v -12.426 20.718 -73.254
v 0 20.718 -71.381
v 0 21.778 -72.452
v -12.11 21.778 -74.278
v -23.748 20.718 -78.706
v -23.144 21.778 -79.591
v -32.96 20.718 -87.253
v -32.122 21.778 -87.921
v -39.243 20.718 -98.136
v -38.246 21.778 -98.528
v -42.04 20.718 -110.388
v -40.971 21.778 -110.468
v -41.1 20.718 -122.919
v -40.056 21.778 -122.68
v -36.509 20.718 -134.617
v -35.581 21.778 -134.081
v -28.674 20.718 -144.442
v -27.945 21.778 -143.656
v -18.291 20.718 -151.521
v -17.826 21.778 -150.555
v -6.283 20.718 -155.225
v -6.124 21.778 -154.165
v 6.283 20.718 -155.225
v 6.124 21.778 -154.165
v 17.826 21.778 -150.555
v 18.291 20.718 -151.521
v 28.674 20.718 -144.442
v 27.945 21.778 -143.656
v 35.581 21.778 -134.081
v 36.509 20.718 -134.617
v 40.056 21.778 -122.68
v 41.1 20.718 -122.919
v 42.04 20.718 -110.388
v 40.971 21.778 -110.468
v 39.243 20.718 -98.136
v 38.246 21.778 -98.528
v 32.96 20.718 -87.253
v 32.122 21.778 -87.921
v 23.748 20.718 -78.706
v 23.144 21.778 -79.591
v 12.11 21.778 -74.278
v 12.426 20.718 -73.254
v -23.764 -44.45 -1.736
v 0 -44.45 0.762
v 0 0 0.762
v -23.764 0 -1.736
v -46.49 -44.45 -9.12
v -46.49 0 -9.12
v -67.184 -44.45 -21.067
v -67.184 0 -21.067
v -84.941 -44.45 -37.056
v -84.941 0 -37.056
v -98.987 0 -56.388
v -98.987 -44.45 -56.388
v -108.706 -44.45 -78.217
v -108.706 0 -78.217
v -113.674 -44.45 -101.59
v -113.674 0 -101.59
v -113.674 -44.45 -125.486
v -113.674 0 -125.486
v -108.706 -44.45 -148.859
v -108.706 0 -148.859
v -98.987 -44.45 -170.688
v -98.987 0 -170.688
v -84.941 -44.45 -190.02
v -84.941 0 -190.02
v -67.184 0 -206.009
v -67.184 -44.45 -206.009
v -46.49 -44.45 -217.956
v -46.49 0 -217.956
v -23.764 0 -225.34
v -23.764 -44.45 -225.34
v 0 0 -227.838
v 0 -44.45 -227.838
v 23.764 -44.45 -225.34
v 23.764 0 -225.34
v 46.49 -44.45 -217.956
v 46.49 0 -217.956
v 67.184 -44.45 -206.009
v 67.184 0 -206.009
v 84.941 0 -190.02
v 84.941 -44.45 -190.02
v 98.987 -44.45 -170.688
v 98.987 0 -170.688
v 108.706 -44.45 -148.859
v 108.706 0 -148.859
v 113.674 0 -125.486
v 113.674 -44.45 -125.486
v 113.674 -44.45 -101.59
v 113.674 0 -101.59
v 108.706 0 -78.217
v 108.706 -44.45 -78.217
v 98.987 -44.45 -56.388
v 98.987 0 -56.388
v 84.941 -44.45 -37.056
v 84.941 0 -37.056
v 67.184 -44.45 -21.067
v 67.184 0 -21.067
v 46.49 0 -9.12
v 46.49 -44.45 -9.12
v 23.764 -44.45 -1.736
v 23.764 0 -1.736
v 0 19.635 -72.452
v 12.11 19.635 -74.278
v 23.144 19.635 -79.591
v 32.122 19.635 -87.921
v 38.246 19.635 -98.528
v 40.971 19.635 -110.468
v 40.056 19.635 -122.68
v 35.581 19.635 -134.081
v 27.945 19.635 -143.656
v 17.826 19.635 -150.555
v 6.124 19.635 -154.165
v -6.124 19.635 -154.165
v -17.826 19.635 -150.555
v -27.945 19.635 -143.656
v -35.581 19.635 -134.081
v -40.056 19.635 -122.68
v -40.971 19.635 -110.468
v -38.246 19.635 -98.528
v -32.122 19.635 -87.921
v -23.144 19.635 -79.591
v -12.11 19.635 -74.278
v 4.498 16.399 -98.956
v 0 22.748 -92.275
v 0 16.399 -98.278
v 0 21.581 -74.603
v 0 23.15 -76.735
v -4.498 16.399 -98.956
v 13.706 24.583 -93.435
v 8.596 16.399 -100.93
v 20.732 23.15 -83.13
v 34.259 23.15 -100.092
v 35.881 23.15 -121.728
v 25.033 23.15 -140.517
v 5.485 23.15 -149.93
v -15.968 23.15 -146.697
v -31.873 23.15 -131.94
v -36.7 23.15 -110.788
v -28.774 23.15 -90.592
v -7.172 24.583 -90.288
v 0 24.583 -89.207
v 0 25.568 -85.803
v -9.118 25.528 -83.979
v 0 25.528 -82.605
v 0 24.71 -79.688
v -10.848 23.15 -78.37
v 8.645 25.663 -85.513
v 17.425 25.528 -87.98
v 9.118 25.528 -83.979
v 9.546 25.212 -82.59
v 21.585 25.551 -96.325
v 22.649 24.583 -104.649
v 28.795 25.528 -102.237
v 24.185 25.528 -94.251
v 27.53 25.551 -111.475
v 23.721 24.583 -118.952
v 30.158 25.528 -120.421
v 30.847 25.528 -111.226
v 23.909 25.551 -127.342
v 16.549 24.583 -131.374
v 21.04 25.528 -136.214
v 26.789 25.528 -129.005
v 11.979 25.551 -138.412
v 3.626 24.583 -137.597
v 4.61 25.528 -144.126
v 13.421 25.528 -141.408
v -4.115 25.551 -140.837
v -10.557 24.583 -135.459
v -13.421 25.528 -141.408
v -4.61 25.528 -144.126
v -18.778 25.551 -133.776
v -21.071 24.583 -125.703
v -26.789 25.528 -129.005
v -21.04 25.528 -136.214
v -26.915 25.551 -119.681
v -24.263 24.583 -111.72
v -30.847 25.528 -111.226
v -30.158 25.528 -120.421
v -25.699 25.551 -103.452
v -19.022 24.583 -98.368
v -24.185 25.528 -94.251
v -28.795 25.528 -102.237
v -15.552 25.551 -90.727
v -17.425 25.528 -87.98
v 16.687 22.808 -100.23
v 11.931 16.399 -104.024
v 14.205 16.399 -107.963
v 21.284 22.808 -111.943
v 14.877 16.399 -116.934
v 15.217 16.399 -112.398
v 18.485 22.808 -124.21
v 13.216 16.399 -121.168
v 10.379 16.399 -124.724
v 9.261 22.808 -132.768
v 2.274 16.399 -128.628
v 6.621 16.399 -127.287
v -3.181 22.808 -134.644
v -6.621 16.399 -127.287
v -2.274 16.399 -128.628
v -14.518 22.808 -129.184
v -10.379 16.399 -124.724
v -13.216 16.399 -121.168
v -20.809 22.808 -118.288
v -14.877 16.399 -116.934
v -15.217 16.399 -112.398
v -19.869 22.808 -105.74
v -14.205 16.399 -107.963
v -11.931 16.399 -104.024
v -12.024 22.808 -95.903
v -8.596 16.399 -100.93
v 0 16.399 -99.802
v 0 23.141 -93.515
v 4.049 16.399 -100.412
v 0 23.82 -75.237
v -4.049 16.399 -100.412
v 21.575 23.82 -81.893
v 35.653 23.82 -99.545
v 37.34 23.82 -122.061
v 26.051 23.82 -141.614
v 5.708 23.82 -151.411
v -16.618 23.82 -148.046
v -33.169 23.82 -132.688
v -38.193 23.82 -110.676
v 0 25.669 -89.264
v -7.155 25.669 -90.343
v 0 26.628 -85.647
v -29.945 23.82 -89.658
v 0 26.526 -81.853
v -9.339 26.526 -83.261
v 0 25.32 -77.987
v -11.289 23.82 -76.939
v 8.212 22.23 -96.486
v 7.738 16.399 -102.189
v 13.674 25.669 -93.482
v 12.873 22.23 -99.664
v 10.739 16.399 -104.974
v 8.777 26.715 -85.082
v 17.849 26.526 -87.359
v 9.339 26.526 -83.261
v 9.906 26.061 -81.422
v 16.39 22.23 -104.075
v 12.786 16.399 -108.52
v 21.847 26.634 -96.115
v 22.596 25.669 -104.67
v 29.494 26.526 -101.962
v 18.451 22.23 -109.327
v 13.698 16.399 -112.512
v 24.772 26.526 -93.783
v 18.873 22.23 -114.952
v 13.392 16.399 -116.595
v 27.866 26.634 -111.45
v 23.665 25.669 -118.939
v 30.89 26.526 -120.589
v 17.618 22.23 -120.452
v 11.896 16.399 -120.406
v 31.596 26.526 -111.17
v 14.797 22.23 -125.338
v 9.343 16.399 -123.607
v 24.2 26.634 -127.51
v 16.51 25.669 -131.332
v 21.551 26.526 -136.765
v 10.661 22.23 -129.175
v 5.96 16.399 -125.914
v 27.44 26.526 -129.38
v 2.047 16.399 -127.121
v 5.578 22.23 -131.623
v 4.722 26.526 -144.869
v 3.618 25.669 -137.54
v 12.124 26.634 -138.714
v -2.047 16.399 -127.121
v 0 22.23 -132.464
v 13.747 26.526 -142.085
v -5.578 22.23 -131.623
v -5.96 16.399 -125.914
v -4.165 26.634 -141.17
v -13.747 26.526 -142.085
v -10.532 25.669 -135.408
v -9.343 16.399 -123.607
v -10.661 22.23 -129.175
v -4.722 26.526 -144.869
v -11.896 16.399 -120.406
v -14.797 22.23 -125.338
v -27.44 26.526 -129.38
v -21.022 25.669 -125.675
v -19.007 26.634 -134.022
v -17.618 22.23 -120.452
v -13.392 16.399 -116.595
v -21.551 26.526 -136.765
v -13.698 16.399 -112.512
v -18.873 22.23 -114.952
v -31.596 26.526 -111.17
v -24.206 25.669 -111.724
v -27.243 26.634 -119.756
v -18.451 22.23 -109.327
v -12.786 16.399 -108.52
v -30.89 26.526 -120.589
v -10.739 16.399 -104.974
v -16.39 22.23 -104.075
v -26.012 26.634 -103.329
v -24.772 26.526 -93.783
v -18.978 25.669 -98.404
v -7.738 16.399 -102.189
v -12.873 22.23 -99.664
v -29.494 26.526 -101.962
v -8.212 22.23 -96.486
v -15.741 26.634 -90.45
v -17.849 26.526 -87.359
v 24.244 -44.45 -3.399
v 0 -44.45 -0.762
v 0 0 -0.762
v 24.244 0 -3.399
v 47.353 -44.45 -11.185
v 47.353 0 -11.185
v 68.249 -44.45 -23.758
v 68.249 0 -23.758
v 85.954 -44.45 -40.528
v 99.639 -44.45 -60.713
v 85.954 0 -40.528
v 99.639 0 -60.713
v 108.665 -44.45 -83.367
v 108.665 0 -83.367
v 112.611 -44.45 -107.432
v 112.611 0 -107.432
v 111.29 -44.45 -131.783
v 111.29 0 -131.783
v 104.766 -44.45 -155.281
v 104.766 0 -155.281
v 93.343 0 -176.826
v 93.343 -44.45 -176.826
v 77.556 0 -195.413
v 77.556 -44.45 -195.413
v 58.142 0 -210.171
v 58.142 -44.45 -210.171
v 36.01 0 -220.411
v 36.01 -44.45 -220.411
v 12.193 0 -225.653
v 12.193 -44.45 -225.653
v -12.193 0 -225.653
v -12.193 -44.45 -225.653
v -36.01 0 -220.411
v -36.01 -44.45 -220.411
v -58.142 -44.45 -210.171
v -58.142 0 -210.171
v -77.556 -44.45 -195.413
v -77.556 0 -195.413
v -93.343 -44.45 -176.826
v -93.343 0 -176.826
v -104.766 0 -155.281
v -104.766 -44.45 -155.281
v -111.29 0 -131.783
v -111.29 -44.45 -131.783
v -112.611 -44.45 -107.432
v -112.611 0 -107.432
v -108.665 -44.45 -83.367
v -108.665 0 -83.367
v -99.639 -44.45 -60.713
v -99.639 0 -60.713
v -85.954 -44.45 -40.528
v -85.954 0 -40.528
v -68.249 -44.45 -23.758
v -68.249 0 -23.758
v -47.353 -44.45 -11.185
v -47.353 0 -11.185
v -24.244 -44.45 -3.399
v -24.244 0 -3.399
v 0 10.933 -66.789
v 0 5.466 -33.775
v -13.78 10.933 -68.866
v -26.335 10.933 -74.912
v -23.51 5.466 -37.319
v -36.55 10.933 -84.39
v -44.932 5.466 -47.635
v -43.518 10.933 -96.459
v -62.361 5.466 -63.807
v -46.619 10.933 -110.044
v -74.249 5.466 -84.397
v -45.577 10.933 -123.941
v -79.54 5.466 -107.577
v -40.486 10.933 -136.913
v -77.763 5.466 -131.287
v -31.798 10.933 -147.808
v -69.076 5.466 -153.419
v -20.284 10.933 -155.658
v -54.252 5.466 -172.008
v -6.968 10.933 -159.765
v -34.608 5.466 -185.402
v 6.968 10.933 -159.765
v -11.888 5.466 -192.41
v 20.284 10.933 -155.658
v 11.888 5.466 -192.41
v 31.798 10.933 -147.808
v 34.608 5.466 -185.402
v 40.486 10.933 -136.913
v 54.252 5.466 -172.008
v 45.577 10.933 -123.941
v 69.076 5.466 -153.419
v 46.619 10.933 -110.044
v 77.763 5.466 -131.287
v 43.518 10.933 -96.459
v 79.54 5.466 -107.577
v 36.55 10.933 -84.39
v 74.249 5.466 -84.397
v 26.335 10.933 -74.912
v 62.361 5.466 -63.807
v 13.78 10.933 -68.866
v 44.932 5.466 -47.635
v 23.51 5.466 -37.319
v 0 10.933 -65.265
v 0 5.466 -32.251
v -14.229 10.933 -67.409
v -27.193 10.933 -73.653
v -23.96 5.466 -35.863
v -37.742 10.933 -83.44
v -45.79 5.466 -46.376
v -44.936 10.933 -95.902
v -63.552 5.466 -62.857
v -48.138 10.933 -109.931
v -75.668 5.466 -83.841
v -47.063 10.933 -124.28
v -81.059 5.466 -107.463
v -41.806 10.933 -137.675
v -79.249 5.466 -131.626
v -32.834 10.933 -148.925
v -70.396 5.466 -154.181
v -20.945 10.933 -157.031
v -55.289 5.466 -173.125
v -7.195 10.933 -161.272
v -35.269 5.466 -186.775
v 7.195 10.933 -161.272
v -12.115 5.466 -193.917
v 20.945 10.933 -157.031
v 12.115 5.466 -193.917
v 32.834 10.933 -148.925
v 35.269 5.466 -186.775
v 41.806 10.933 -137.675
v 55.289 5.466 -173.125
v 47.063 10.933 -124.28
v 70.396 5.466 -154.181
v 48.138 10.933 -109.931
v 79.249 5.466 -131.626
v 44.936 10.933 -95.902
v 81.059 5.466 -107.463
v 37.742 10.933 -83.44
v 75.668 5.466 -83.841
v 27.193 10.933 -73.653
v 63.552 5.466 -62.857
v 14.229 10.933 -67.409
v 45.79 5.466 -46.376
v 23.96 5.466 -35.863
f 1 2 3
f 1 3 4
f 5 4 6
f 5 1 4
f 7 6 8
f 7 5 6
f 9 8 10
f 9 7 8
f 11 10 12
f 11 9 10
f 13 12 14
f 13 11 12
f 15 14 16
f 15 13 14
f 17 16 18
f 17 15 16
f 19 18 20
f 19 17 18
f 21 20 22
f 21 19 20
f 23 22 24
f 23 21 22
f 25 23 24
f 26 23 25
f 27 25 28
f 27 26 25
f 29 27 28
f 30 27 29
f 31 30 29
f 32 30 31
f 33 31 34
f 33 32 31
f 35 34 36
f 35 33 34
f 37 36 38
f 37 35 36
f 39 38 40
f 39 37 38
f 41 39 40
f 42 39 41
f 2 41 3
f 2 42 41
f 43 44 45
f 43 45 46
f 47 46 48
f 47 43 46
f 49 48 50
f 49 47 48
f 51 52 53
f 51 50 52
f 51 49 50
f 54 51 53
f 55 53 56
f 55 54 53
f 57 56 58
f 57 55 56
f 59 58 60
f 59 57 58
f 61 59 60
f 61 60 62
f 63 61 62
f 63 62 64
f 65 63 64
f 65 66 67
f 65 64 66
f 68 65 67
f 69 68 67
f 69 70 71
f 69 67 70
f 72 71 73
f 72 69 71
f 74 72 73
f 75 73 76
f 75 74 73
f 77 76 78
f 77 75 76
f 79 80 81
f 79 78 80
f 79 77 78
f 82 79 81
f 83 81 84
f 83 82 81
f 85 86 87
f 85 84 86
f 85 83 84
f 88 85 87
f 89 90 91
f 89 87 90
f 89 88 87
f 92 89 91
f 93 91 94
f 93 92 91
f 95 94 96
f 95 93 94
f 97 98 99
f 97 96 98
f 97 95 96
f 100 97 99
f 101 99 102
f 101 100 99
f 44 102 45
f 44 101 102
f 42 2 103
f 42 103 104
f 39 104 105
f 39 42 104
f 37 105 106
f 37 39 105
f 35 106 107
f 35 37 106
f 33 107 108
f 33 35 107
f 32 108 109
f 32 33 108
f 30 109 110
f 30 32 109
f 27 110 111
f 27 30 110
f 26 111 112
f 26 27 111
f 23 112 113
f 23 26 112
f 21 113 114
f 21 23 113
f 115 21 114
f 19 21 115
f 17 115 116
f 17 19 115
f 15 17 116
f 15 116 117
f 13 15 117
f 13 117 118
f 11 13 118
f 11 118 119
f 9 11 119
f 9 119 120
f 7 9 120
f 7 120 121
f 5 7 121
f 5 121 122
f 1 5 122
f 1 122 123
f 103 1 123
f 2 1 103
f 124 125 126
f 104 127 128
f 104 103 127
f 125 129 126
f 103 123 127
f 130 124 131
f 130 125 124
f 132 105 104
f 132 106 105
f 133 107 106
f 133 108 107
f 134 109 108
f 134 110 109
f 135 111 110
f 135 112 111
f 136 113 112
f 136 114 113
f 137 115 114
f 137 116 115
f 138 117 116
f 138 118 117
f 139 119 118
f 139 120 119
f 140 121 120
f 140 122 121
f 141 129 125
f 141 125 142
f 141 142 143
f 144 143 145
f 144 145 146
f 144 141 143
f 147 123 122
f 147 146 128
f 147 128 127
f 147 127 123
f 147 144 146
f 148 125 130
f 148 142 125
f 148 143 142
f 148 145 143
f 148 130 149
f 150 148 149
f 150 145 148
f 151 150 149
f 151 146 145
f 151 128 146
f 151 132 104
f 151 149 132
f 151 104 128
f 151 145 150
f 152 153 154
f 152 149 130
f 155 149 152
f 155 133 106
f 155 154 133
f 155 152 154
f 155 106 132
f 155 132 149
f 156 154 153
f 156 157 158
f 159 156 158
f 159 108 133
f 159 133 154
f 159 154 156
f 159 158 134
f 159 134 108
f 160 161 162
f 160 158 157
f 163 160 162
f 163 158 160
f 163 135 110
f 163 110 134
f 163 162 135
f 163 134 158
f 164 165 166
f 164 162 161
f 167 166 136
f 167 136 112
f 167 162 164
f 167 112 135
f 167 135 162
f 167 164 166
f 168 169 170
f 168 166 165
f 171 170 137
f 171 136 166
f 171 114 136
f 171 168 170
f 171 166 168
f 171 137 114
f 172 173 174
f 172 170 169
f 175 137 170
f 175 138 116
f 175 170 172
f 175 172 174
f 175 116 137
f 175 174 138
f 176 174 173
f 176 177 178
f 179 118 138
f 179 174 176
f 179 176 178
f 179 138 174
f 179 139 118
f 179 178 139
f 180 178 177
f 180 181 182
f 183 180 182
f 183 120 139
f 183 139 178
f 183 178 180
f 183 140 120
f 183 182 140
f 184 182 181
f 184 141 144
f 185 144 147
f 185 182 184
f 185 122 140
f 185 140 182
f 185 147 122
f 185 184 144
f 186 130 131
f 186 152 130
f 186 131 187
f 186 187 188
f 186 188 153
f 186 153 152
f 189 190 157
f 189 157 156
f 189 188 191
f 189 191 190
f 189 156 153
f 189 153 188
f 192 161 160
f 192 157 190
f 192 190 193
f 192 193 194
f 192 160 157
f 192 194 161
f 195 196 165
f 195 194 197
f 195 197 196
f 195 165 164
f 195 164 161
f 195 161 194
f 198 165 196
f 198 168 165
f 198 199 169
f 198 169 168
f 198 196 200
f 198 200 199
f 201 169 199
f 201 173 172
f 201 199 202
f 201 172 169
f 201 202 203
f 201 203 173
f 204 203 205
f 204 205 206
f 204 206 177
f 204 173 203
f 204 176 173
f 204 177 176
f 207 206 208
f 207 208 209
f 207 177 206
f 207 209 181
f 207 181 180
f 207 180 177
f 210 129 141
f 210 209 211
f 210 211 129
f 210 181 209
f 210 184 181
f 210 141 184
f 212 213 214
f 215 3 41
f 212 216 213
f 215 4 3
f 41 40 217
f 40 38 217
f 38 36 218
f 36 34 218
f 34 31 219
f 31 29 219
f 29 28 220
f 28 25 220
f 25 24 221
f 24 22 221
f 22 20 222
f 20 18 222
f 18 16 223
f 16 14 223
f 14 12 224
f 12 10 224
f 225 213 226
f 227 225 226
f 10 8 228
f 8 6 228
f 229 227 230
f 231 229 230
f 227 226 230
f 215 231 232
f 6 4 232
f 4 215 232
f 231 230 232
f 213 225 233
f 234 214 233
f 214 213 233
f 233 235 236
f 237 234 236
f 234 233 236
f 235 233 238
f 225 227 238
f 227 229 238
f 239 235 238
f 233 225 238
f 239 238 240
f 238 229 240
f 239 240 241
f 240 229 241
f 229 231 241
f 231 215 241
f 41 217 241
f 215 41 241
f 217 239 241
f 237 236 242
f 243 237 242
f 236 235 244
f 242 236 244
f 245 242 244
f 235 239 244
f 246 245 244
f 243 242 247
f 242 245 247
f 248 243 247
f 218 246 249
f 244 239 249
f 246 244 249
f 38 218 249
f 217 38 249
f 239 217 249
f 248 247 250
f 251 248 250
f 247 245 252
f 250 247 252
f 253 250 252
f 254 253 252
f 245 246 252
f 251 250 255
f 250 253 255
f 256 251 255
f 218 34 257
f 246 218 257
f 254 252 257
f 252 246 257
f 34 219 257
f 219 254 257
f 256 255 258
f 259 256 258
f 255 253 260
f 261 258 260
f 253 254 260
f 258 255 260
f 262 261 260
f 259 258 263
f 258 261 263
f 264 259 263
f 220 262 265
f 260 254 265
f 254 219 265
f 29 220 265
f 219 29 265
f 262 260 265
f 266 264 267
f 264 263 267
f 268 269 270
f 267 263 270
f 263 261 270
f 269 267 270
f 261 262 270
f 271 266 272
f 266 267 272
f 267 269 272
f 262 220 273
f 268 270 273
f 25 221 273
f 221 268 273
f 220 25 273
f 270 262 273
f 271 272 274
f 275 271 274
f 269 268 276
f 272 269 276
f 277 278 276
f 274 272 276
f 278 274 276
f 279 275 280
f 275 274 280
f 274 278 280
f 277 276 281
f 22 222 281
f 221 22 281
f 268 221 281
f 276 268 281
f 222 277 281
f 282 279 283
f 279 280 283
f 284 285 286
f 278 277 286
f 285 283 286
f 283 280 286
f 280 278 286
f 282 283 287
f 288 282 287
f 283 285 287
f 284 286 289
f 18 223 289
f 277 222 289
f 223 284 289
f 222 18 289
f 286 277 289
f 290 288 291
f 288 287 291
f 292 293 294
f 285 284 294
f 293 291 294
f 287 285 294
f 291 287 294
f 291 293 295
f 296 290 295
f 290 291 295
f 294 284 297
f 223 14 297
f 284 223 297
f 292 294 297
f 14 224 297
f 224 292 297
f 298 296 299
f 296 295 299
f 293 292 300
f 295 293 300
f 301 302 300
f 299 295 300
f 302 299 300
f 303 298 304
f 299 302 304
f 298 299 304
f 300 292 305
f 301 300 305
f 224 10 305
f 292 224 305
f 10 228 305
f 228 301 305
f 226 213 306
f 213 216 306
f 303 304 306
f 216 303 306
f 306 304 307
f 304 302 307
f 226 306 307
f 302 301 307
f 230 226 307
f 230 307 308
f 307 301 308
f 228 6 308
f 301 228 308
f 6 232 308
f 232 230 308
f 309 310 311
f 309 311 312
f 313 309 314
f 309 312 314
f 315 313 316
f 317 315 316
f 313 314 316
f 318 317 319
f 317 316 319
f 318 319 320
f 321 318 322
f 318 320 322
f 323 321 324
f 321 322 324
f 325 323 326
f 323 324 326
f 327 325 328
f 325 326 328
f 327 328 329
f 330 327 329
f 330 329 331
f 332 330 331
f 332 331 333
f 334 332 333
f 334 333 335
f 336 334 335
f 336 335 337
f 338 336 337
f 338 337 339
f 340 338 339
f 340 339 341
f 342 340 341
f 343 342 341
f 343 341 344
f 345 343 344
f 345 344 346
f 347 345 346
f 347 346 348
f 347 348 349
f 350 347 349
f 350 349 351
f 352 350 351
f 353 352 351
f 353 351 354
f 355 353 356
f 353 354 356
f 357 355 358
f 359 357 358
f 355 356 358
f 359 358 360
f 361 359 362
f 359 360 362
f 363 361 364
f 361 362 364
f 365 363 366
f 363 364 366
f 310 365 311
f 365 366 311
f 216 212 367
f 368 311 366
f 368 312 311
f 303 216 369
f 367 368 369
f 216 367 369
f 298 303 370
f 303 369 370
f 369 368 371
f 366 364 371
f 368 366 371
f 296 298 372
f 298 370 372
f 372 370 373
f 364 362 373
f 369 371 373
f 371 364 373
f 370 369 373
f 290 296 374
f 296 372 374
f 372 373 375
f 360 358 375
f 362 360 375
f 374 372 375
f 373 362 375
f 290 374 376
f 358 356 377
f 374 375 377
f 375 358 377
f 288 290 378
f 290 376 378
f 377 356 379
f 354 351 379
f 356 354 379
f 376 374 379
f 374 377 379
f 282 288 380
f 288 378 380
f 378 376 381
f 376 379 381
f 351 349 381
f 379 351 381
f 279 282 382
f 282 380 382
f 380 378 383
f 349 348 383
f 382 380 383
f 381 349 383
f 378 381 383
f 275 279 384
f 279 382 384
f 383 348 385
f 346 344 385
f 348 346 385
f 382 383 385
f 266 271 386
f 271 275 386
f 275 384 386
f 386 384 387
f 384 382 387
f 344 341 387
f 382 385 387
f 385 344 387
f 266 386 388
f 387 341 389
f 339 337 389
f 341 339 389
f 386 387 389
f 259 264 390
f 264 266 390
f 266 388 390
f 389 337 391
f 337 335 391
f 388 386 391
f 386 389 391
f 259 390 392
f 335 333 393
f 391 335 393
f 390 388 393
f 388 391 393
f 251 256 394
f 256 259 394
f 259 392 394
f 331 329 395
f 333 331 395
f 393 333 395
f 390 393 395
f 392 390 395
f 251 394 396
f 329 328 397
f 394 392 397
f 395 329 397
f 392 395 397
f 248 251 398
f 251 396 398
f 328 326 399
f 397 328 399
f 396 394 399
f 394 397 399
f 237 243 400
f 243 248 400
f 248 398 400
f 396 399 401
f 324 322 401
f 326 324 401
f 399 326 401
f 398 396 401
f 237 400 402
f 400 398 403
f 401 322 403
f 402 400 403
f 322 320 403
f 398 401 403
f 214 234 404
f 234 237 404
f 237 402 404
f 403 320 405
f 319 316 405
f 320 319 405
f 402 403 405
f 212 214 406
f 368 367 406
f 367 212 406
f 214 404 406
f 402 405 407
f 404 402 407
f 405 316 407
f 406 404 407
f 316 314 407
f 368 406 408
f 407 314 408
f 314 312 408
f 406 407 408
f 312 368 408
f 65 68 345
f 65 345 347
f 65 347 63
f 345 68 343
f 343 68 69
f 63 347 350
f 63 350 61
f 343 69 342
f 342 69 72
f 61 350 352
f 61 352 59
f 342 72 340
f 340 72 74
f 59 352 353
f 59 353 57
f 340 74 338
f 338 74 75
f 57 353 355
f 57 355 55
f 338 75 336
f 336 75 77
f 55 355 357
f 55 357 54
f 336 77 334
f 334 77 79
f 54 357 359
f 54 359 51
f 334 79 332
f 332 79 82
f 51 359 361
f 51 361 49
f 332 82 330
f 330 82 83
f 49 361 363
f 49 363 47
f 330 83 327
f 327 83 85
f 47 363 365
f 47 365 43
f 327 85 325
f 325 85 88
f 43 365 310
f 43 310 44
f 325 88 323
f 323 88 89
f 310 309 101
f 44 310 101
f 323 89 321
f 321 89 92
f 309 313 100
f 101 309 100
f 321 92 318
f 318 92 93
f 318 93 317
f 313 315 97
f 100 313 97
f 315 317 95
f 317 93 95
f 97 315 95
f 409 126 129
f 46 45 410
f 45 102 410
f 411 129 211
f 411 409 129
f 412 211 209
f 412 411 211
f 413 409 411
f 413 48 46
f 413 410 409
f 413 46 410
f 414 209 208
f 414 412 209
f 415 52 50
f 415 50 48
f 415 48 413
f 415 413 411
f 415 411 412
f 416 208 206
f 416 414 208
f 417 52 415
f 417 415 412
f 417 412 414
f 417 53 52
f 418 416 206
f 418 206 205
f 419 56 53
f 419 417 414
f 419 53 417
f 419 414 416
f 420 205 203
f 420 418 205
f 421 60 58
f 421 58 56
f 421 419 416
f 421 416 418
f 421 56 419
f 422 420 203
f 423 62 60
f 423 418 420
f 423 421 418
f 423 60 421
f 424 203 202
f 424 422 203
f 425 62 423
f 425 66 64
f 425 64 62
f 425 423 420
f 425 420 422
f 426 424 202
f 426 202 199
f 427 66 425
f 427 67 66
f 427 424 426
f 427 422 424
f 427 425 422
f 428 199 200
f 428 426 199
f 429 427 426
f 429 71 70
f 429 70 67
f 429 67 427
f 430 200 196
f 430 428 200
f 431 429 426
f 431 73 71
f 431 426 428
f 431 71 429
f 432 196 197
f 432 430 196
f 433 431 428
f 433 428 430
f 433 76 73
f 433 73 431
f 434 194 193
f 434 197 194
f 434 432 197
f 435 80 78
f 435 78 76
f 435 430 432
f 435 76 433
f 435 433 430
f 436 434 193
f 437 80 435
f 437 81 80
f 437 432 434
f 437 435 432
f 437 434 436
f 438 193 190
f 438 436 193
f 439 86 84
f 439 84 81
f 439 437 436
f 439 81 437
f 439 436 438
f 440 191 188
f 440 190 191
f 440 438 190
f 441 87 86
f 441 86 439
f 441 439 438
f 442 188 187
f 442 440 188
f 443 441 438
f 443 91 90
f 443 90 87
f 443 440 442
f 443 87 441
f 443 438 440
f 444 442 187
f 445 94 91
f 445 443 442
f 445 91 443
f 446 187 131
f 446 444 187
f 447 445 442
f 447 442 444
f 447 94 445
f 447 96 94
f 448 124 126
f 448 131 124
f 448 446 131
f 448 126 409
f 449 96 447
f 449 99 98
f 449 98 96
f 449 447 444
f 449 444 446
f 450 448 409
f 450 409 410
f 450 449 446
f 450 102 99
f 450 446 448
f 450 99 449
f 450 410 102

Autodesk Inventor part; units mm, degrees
ref_plane "YZ Plane" through (0, 0, 0) normal (1, 0, 0) x (0, 1, 0)
ref_plane "XZ Plane" through (0, 0, 0) normal (0, 1, 0) x (-1, 0, 0)
ref_plane "XY Plane" through (0, 0, 0) normal (0, 0, 1) x (1, 0, 0)
sketch "Sketch1" plane through (0, 0, 0) normal (1, 0, 0) x (0, 1, 0)
  line L0 (16.3991, -98.278) -> (51.3241, -72.878) construction
  line L1 (51.3241, -72.878) -> (51.3241, -74.402) construction
  line L2 (51.3241, -74.402) -> (16.3991, -99.802) construction
  line L3 (0, -113.538) -> (16.3991, -113.538)
  line L4 (0, 0.762) -> (0, -0.762)
  line L5 (0, 0.762) -> (16.3991, -98.278)
  line L6 (0, -0.762) -> (16.3991, -99.802)
  line L7 (16.3991, -99.802) -> (16.3991, -98.278)
  line L8 (16.3991, -98.278) -> (33.1367, -86.1052) construction
  line L9 (33.1367, -86.1052) -> (19.6348, -72.4523) construction
  spline S0 degree 2 poles (16.3991, -98.278) (33.1367, -86.1052) (19.6348, -72.4523) knots 1 1 1 2 2 2
  line L10 (19.6348, -72.4523) -> (20.7184, -71.3806)
  line L11 (16.3991, -99.802) -> (33.8616, -87.102) construction
  line L12 (33.8616, -87.102) -> (21.7781, -72.4523) construction
  spline S1 degree 2 poles (16.3991, -99.802) (33.8616, -87.102) (21.7781, -72.4523) knots 1 1 1 2 2 2
  line L13 (21.7781, -72.4523) -> (20.7184, -71.3806)
  line L14 (0, 0.762) -> (-44.45, 0.762)
  line L15 (-44.45, 0.762) -> (-44.45, -0.762)
  line L16 (-44.45, -0.762) -> (0, -0.762)
  line L17 (0, -0.762) -> (0, 0.762)
  point P0 (0, 0)
  dimension "d5" = 1.524
  dimension "d8" = 34.925
  dimension "d26" = 1.524
  dimension "d27" = 1.524
  dimension "d28" = 1.524
  dimension "d30" = 44.45
  dimension "d31" = 1.524
  dimension "d32" = 114.3
revolve "Revolution2" add sketch "Sketch1" angle 360 about axis through (0, 0, -113.538) along (0, 1, 0)
properties part number "rubber_sleeve" material "Rubber"
